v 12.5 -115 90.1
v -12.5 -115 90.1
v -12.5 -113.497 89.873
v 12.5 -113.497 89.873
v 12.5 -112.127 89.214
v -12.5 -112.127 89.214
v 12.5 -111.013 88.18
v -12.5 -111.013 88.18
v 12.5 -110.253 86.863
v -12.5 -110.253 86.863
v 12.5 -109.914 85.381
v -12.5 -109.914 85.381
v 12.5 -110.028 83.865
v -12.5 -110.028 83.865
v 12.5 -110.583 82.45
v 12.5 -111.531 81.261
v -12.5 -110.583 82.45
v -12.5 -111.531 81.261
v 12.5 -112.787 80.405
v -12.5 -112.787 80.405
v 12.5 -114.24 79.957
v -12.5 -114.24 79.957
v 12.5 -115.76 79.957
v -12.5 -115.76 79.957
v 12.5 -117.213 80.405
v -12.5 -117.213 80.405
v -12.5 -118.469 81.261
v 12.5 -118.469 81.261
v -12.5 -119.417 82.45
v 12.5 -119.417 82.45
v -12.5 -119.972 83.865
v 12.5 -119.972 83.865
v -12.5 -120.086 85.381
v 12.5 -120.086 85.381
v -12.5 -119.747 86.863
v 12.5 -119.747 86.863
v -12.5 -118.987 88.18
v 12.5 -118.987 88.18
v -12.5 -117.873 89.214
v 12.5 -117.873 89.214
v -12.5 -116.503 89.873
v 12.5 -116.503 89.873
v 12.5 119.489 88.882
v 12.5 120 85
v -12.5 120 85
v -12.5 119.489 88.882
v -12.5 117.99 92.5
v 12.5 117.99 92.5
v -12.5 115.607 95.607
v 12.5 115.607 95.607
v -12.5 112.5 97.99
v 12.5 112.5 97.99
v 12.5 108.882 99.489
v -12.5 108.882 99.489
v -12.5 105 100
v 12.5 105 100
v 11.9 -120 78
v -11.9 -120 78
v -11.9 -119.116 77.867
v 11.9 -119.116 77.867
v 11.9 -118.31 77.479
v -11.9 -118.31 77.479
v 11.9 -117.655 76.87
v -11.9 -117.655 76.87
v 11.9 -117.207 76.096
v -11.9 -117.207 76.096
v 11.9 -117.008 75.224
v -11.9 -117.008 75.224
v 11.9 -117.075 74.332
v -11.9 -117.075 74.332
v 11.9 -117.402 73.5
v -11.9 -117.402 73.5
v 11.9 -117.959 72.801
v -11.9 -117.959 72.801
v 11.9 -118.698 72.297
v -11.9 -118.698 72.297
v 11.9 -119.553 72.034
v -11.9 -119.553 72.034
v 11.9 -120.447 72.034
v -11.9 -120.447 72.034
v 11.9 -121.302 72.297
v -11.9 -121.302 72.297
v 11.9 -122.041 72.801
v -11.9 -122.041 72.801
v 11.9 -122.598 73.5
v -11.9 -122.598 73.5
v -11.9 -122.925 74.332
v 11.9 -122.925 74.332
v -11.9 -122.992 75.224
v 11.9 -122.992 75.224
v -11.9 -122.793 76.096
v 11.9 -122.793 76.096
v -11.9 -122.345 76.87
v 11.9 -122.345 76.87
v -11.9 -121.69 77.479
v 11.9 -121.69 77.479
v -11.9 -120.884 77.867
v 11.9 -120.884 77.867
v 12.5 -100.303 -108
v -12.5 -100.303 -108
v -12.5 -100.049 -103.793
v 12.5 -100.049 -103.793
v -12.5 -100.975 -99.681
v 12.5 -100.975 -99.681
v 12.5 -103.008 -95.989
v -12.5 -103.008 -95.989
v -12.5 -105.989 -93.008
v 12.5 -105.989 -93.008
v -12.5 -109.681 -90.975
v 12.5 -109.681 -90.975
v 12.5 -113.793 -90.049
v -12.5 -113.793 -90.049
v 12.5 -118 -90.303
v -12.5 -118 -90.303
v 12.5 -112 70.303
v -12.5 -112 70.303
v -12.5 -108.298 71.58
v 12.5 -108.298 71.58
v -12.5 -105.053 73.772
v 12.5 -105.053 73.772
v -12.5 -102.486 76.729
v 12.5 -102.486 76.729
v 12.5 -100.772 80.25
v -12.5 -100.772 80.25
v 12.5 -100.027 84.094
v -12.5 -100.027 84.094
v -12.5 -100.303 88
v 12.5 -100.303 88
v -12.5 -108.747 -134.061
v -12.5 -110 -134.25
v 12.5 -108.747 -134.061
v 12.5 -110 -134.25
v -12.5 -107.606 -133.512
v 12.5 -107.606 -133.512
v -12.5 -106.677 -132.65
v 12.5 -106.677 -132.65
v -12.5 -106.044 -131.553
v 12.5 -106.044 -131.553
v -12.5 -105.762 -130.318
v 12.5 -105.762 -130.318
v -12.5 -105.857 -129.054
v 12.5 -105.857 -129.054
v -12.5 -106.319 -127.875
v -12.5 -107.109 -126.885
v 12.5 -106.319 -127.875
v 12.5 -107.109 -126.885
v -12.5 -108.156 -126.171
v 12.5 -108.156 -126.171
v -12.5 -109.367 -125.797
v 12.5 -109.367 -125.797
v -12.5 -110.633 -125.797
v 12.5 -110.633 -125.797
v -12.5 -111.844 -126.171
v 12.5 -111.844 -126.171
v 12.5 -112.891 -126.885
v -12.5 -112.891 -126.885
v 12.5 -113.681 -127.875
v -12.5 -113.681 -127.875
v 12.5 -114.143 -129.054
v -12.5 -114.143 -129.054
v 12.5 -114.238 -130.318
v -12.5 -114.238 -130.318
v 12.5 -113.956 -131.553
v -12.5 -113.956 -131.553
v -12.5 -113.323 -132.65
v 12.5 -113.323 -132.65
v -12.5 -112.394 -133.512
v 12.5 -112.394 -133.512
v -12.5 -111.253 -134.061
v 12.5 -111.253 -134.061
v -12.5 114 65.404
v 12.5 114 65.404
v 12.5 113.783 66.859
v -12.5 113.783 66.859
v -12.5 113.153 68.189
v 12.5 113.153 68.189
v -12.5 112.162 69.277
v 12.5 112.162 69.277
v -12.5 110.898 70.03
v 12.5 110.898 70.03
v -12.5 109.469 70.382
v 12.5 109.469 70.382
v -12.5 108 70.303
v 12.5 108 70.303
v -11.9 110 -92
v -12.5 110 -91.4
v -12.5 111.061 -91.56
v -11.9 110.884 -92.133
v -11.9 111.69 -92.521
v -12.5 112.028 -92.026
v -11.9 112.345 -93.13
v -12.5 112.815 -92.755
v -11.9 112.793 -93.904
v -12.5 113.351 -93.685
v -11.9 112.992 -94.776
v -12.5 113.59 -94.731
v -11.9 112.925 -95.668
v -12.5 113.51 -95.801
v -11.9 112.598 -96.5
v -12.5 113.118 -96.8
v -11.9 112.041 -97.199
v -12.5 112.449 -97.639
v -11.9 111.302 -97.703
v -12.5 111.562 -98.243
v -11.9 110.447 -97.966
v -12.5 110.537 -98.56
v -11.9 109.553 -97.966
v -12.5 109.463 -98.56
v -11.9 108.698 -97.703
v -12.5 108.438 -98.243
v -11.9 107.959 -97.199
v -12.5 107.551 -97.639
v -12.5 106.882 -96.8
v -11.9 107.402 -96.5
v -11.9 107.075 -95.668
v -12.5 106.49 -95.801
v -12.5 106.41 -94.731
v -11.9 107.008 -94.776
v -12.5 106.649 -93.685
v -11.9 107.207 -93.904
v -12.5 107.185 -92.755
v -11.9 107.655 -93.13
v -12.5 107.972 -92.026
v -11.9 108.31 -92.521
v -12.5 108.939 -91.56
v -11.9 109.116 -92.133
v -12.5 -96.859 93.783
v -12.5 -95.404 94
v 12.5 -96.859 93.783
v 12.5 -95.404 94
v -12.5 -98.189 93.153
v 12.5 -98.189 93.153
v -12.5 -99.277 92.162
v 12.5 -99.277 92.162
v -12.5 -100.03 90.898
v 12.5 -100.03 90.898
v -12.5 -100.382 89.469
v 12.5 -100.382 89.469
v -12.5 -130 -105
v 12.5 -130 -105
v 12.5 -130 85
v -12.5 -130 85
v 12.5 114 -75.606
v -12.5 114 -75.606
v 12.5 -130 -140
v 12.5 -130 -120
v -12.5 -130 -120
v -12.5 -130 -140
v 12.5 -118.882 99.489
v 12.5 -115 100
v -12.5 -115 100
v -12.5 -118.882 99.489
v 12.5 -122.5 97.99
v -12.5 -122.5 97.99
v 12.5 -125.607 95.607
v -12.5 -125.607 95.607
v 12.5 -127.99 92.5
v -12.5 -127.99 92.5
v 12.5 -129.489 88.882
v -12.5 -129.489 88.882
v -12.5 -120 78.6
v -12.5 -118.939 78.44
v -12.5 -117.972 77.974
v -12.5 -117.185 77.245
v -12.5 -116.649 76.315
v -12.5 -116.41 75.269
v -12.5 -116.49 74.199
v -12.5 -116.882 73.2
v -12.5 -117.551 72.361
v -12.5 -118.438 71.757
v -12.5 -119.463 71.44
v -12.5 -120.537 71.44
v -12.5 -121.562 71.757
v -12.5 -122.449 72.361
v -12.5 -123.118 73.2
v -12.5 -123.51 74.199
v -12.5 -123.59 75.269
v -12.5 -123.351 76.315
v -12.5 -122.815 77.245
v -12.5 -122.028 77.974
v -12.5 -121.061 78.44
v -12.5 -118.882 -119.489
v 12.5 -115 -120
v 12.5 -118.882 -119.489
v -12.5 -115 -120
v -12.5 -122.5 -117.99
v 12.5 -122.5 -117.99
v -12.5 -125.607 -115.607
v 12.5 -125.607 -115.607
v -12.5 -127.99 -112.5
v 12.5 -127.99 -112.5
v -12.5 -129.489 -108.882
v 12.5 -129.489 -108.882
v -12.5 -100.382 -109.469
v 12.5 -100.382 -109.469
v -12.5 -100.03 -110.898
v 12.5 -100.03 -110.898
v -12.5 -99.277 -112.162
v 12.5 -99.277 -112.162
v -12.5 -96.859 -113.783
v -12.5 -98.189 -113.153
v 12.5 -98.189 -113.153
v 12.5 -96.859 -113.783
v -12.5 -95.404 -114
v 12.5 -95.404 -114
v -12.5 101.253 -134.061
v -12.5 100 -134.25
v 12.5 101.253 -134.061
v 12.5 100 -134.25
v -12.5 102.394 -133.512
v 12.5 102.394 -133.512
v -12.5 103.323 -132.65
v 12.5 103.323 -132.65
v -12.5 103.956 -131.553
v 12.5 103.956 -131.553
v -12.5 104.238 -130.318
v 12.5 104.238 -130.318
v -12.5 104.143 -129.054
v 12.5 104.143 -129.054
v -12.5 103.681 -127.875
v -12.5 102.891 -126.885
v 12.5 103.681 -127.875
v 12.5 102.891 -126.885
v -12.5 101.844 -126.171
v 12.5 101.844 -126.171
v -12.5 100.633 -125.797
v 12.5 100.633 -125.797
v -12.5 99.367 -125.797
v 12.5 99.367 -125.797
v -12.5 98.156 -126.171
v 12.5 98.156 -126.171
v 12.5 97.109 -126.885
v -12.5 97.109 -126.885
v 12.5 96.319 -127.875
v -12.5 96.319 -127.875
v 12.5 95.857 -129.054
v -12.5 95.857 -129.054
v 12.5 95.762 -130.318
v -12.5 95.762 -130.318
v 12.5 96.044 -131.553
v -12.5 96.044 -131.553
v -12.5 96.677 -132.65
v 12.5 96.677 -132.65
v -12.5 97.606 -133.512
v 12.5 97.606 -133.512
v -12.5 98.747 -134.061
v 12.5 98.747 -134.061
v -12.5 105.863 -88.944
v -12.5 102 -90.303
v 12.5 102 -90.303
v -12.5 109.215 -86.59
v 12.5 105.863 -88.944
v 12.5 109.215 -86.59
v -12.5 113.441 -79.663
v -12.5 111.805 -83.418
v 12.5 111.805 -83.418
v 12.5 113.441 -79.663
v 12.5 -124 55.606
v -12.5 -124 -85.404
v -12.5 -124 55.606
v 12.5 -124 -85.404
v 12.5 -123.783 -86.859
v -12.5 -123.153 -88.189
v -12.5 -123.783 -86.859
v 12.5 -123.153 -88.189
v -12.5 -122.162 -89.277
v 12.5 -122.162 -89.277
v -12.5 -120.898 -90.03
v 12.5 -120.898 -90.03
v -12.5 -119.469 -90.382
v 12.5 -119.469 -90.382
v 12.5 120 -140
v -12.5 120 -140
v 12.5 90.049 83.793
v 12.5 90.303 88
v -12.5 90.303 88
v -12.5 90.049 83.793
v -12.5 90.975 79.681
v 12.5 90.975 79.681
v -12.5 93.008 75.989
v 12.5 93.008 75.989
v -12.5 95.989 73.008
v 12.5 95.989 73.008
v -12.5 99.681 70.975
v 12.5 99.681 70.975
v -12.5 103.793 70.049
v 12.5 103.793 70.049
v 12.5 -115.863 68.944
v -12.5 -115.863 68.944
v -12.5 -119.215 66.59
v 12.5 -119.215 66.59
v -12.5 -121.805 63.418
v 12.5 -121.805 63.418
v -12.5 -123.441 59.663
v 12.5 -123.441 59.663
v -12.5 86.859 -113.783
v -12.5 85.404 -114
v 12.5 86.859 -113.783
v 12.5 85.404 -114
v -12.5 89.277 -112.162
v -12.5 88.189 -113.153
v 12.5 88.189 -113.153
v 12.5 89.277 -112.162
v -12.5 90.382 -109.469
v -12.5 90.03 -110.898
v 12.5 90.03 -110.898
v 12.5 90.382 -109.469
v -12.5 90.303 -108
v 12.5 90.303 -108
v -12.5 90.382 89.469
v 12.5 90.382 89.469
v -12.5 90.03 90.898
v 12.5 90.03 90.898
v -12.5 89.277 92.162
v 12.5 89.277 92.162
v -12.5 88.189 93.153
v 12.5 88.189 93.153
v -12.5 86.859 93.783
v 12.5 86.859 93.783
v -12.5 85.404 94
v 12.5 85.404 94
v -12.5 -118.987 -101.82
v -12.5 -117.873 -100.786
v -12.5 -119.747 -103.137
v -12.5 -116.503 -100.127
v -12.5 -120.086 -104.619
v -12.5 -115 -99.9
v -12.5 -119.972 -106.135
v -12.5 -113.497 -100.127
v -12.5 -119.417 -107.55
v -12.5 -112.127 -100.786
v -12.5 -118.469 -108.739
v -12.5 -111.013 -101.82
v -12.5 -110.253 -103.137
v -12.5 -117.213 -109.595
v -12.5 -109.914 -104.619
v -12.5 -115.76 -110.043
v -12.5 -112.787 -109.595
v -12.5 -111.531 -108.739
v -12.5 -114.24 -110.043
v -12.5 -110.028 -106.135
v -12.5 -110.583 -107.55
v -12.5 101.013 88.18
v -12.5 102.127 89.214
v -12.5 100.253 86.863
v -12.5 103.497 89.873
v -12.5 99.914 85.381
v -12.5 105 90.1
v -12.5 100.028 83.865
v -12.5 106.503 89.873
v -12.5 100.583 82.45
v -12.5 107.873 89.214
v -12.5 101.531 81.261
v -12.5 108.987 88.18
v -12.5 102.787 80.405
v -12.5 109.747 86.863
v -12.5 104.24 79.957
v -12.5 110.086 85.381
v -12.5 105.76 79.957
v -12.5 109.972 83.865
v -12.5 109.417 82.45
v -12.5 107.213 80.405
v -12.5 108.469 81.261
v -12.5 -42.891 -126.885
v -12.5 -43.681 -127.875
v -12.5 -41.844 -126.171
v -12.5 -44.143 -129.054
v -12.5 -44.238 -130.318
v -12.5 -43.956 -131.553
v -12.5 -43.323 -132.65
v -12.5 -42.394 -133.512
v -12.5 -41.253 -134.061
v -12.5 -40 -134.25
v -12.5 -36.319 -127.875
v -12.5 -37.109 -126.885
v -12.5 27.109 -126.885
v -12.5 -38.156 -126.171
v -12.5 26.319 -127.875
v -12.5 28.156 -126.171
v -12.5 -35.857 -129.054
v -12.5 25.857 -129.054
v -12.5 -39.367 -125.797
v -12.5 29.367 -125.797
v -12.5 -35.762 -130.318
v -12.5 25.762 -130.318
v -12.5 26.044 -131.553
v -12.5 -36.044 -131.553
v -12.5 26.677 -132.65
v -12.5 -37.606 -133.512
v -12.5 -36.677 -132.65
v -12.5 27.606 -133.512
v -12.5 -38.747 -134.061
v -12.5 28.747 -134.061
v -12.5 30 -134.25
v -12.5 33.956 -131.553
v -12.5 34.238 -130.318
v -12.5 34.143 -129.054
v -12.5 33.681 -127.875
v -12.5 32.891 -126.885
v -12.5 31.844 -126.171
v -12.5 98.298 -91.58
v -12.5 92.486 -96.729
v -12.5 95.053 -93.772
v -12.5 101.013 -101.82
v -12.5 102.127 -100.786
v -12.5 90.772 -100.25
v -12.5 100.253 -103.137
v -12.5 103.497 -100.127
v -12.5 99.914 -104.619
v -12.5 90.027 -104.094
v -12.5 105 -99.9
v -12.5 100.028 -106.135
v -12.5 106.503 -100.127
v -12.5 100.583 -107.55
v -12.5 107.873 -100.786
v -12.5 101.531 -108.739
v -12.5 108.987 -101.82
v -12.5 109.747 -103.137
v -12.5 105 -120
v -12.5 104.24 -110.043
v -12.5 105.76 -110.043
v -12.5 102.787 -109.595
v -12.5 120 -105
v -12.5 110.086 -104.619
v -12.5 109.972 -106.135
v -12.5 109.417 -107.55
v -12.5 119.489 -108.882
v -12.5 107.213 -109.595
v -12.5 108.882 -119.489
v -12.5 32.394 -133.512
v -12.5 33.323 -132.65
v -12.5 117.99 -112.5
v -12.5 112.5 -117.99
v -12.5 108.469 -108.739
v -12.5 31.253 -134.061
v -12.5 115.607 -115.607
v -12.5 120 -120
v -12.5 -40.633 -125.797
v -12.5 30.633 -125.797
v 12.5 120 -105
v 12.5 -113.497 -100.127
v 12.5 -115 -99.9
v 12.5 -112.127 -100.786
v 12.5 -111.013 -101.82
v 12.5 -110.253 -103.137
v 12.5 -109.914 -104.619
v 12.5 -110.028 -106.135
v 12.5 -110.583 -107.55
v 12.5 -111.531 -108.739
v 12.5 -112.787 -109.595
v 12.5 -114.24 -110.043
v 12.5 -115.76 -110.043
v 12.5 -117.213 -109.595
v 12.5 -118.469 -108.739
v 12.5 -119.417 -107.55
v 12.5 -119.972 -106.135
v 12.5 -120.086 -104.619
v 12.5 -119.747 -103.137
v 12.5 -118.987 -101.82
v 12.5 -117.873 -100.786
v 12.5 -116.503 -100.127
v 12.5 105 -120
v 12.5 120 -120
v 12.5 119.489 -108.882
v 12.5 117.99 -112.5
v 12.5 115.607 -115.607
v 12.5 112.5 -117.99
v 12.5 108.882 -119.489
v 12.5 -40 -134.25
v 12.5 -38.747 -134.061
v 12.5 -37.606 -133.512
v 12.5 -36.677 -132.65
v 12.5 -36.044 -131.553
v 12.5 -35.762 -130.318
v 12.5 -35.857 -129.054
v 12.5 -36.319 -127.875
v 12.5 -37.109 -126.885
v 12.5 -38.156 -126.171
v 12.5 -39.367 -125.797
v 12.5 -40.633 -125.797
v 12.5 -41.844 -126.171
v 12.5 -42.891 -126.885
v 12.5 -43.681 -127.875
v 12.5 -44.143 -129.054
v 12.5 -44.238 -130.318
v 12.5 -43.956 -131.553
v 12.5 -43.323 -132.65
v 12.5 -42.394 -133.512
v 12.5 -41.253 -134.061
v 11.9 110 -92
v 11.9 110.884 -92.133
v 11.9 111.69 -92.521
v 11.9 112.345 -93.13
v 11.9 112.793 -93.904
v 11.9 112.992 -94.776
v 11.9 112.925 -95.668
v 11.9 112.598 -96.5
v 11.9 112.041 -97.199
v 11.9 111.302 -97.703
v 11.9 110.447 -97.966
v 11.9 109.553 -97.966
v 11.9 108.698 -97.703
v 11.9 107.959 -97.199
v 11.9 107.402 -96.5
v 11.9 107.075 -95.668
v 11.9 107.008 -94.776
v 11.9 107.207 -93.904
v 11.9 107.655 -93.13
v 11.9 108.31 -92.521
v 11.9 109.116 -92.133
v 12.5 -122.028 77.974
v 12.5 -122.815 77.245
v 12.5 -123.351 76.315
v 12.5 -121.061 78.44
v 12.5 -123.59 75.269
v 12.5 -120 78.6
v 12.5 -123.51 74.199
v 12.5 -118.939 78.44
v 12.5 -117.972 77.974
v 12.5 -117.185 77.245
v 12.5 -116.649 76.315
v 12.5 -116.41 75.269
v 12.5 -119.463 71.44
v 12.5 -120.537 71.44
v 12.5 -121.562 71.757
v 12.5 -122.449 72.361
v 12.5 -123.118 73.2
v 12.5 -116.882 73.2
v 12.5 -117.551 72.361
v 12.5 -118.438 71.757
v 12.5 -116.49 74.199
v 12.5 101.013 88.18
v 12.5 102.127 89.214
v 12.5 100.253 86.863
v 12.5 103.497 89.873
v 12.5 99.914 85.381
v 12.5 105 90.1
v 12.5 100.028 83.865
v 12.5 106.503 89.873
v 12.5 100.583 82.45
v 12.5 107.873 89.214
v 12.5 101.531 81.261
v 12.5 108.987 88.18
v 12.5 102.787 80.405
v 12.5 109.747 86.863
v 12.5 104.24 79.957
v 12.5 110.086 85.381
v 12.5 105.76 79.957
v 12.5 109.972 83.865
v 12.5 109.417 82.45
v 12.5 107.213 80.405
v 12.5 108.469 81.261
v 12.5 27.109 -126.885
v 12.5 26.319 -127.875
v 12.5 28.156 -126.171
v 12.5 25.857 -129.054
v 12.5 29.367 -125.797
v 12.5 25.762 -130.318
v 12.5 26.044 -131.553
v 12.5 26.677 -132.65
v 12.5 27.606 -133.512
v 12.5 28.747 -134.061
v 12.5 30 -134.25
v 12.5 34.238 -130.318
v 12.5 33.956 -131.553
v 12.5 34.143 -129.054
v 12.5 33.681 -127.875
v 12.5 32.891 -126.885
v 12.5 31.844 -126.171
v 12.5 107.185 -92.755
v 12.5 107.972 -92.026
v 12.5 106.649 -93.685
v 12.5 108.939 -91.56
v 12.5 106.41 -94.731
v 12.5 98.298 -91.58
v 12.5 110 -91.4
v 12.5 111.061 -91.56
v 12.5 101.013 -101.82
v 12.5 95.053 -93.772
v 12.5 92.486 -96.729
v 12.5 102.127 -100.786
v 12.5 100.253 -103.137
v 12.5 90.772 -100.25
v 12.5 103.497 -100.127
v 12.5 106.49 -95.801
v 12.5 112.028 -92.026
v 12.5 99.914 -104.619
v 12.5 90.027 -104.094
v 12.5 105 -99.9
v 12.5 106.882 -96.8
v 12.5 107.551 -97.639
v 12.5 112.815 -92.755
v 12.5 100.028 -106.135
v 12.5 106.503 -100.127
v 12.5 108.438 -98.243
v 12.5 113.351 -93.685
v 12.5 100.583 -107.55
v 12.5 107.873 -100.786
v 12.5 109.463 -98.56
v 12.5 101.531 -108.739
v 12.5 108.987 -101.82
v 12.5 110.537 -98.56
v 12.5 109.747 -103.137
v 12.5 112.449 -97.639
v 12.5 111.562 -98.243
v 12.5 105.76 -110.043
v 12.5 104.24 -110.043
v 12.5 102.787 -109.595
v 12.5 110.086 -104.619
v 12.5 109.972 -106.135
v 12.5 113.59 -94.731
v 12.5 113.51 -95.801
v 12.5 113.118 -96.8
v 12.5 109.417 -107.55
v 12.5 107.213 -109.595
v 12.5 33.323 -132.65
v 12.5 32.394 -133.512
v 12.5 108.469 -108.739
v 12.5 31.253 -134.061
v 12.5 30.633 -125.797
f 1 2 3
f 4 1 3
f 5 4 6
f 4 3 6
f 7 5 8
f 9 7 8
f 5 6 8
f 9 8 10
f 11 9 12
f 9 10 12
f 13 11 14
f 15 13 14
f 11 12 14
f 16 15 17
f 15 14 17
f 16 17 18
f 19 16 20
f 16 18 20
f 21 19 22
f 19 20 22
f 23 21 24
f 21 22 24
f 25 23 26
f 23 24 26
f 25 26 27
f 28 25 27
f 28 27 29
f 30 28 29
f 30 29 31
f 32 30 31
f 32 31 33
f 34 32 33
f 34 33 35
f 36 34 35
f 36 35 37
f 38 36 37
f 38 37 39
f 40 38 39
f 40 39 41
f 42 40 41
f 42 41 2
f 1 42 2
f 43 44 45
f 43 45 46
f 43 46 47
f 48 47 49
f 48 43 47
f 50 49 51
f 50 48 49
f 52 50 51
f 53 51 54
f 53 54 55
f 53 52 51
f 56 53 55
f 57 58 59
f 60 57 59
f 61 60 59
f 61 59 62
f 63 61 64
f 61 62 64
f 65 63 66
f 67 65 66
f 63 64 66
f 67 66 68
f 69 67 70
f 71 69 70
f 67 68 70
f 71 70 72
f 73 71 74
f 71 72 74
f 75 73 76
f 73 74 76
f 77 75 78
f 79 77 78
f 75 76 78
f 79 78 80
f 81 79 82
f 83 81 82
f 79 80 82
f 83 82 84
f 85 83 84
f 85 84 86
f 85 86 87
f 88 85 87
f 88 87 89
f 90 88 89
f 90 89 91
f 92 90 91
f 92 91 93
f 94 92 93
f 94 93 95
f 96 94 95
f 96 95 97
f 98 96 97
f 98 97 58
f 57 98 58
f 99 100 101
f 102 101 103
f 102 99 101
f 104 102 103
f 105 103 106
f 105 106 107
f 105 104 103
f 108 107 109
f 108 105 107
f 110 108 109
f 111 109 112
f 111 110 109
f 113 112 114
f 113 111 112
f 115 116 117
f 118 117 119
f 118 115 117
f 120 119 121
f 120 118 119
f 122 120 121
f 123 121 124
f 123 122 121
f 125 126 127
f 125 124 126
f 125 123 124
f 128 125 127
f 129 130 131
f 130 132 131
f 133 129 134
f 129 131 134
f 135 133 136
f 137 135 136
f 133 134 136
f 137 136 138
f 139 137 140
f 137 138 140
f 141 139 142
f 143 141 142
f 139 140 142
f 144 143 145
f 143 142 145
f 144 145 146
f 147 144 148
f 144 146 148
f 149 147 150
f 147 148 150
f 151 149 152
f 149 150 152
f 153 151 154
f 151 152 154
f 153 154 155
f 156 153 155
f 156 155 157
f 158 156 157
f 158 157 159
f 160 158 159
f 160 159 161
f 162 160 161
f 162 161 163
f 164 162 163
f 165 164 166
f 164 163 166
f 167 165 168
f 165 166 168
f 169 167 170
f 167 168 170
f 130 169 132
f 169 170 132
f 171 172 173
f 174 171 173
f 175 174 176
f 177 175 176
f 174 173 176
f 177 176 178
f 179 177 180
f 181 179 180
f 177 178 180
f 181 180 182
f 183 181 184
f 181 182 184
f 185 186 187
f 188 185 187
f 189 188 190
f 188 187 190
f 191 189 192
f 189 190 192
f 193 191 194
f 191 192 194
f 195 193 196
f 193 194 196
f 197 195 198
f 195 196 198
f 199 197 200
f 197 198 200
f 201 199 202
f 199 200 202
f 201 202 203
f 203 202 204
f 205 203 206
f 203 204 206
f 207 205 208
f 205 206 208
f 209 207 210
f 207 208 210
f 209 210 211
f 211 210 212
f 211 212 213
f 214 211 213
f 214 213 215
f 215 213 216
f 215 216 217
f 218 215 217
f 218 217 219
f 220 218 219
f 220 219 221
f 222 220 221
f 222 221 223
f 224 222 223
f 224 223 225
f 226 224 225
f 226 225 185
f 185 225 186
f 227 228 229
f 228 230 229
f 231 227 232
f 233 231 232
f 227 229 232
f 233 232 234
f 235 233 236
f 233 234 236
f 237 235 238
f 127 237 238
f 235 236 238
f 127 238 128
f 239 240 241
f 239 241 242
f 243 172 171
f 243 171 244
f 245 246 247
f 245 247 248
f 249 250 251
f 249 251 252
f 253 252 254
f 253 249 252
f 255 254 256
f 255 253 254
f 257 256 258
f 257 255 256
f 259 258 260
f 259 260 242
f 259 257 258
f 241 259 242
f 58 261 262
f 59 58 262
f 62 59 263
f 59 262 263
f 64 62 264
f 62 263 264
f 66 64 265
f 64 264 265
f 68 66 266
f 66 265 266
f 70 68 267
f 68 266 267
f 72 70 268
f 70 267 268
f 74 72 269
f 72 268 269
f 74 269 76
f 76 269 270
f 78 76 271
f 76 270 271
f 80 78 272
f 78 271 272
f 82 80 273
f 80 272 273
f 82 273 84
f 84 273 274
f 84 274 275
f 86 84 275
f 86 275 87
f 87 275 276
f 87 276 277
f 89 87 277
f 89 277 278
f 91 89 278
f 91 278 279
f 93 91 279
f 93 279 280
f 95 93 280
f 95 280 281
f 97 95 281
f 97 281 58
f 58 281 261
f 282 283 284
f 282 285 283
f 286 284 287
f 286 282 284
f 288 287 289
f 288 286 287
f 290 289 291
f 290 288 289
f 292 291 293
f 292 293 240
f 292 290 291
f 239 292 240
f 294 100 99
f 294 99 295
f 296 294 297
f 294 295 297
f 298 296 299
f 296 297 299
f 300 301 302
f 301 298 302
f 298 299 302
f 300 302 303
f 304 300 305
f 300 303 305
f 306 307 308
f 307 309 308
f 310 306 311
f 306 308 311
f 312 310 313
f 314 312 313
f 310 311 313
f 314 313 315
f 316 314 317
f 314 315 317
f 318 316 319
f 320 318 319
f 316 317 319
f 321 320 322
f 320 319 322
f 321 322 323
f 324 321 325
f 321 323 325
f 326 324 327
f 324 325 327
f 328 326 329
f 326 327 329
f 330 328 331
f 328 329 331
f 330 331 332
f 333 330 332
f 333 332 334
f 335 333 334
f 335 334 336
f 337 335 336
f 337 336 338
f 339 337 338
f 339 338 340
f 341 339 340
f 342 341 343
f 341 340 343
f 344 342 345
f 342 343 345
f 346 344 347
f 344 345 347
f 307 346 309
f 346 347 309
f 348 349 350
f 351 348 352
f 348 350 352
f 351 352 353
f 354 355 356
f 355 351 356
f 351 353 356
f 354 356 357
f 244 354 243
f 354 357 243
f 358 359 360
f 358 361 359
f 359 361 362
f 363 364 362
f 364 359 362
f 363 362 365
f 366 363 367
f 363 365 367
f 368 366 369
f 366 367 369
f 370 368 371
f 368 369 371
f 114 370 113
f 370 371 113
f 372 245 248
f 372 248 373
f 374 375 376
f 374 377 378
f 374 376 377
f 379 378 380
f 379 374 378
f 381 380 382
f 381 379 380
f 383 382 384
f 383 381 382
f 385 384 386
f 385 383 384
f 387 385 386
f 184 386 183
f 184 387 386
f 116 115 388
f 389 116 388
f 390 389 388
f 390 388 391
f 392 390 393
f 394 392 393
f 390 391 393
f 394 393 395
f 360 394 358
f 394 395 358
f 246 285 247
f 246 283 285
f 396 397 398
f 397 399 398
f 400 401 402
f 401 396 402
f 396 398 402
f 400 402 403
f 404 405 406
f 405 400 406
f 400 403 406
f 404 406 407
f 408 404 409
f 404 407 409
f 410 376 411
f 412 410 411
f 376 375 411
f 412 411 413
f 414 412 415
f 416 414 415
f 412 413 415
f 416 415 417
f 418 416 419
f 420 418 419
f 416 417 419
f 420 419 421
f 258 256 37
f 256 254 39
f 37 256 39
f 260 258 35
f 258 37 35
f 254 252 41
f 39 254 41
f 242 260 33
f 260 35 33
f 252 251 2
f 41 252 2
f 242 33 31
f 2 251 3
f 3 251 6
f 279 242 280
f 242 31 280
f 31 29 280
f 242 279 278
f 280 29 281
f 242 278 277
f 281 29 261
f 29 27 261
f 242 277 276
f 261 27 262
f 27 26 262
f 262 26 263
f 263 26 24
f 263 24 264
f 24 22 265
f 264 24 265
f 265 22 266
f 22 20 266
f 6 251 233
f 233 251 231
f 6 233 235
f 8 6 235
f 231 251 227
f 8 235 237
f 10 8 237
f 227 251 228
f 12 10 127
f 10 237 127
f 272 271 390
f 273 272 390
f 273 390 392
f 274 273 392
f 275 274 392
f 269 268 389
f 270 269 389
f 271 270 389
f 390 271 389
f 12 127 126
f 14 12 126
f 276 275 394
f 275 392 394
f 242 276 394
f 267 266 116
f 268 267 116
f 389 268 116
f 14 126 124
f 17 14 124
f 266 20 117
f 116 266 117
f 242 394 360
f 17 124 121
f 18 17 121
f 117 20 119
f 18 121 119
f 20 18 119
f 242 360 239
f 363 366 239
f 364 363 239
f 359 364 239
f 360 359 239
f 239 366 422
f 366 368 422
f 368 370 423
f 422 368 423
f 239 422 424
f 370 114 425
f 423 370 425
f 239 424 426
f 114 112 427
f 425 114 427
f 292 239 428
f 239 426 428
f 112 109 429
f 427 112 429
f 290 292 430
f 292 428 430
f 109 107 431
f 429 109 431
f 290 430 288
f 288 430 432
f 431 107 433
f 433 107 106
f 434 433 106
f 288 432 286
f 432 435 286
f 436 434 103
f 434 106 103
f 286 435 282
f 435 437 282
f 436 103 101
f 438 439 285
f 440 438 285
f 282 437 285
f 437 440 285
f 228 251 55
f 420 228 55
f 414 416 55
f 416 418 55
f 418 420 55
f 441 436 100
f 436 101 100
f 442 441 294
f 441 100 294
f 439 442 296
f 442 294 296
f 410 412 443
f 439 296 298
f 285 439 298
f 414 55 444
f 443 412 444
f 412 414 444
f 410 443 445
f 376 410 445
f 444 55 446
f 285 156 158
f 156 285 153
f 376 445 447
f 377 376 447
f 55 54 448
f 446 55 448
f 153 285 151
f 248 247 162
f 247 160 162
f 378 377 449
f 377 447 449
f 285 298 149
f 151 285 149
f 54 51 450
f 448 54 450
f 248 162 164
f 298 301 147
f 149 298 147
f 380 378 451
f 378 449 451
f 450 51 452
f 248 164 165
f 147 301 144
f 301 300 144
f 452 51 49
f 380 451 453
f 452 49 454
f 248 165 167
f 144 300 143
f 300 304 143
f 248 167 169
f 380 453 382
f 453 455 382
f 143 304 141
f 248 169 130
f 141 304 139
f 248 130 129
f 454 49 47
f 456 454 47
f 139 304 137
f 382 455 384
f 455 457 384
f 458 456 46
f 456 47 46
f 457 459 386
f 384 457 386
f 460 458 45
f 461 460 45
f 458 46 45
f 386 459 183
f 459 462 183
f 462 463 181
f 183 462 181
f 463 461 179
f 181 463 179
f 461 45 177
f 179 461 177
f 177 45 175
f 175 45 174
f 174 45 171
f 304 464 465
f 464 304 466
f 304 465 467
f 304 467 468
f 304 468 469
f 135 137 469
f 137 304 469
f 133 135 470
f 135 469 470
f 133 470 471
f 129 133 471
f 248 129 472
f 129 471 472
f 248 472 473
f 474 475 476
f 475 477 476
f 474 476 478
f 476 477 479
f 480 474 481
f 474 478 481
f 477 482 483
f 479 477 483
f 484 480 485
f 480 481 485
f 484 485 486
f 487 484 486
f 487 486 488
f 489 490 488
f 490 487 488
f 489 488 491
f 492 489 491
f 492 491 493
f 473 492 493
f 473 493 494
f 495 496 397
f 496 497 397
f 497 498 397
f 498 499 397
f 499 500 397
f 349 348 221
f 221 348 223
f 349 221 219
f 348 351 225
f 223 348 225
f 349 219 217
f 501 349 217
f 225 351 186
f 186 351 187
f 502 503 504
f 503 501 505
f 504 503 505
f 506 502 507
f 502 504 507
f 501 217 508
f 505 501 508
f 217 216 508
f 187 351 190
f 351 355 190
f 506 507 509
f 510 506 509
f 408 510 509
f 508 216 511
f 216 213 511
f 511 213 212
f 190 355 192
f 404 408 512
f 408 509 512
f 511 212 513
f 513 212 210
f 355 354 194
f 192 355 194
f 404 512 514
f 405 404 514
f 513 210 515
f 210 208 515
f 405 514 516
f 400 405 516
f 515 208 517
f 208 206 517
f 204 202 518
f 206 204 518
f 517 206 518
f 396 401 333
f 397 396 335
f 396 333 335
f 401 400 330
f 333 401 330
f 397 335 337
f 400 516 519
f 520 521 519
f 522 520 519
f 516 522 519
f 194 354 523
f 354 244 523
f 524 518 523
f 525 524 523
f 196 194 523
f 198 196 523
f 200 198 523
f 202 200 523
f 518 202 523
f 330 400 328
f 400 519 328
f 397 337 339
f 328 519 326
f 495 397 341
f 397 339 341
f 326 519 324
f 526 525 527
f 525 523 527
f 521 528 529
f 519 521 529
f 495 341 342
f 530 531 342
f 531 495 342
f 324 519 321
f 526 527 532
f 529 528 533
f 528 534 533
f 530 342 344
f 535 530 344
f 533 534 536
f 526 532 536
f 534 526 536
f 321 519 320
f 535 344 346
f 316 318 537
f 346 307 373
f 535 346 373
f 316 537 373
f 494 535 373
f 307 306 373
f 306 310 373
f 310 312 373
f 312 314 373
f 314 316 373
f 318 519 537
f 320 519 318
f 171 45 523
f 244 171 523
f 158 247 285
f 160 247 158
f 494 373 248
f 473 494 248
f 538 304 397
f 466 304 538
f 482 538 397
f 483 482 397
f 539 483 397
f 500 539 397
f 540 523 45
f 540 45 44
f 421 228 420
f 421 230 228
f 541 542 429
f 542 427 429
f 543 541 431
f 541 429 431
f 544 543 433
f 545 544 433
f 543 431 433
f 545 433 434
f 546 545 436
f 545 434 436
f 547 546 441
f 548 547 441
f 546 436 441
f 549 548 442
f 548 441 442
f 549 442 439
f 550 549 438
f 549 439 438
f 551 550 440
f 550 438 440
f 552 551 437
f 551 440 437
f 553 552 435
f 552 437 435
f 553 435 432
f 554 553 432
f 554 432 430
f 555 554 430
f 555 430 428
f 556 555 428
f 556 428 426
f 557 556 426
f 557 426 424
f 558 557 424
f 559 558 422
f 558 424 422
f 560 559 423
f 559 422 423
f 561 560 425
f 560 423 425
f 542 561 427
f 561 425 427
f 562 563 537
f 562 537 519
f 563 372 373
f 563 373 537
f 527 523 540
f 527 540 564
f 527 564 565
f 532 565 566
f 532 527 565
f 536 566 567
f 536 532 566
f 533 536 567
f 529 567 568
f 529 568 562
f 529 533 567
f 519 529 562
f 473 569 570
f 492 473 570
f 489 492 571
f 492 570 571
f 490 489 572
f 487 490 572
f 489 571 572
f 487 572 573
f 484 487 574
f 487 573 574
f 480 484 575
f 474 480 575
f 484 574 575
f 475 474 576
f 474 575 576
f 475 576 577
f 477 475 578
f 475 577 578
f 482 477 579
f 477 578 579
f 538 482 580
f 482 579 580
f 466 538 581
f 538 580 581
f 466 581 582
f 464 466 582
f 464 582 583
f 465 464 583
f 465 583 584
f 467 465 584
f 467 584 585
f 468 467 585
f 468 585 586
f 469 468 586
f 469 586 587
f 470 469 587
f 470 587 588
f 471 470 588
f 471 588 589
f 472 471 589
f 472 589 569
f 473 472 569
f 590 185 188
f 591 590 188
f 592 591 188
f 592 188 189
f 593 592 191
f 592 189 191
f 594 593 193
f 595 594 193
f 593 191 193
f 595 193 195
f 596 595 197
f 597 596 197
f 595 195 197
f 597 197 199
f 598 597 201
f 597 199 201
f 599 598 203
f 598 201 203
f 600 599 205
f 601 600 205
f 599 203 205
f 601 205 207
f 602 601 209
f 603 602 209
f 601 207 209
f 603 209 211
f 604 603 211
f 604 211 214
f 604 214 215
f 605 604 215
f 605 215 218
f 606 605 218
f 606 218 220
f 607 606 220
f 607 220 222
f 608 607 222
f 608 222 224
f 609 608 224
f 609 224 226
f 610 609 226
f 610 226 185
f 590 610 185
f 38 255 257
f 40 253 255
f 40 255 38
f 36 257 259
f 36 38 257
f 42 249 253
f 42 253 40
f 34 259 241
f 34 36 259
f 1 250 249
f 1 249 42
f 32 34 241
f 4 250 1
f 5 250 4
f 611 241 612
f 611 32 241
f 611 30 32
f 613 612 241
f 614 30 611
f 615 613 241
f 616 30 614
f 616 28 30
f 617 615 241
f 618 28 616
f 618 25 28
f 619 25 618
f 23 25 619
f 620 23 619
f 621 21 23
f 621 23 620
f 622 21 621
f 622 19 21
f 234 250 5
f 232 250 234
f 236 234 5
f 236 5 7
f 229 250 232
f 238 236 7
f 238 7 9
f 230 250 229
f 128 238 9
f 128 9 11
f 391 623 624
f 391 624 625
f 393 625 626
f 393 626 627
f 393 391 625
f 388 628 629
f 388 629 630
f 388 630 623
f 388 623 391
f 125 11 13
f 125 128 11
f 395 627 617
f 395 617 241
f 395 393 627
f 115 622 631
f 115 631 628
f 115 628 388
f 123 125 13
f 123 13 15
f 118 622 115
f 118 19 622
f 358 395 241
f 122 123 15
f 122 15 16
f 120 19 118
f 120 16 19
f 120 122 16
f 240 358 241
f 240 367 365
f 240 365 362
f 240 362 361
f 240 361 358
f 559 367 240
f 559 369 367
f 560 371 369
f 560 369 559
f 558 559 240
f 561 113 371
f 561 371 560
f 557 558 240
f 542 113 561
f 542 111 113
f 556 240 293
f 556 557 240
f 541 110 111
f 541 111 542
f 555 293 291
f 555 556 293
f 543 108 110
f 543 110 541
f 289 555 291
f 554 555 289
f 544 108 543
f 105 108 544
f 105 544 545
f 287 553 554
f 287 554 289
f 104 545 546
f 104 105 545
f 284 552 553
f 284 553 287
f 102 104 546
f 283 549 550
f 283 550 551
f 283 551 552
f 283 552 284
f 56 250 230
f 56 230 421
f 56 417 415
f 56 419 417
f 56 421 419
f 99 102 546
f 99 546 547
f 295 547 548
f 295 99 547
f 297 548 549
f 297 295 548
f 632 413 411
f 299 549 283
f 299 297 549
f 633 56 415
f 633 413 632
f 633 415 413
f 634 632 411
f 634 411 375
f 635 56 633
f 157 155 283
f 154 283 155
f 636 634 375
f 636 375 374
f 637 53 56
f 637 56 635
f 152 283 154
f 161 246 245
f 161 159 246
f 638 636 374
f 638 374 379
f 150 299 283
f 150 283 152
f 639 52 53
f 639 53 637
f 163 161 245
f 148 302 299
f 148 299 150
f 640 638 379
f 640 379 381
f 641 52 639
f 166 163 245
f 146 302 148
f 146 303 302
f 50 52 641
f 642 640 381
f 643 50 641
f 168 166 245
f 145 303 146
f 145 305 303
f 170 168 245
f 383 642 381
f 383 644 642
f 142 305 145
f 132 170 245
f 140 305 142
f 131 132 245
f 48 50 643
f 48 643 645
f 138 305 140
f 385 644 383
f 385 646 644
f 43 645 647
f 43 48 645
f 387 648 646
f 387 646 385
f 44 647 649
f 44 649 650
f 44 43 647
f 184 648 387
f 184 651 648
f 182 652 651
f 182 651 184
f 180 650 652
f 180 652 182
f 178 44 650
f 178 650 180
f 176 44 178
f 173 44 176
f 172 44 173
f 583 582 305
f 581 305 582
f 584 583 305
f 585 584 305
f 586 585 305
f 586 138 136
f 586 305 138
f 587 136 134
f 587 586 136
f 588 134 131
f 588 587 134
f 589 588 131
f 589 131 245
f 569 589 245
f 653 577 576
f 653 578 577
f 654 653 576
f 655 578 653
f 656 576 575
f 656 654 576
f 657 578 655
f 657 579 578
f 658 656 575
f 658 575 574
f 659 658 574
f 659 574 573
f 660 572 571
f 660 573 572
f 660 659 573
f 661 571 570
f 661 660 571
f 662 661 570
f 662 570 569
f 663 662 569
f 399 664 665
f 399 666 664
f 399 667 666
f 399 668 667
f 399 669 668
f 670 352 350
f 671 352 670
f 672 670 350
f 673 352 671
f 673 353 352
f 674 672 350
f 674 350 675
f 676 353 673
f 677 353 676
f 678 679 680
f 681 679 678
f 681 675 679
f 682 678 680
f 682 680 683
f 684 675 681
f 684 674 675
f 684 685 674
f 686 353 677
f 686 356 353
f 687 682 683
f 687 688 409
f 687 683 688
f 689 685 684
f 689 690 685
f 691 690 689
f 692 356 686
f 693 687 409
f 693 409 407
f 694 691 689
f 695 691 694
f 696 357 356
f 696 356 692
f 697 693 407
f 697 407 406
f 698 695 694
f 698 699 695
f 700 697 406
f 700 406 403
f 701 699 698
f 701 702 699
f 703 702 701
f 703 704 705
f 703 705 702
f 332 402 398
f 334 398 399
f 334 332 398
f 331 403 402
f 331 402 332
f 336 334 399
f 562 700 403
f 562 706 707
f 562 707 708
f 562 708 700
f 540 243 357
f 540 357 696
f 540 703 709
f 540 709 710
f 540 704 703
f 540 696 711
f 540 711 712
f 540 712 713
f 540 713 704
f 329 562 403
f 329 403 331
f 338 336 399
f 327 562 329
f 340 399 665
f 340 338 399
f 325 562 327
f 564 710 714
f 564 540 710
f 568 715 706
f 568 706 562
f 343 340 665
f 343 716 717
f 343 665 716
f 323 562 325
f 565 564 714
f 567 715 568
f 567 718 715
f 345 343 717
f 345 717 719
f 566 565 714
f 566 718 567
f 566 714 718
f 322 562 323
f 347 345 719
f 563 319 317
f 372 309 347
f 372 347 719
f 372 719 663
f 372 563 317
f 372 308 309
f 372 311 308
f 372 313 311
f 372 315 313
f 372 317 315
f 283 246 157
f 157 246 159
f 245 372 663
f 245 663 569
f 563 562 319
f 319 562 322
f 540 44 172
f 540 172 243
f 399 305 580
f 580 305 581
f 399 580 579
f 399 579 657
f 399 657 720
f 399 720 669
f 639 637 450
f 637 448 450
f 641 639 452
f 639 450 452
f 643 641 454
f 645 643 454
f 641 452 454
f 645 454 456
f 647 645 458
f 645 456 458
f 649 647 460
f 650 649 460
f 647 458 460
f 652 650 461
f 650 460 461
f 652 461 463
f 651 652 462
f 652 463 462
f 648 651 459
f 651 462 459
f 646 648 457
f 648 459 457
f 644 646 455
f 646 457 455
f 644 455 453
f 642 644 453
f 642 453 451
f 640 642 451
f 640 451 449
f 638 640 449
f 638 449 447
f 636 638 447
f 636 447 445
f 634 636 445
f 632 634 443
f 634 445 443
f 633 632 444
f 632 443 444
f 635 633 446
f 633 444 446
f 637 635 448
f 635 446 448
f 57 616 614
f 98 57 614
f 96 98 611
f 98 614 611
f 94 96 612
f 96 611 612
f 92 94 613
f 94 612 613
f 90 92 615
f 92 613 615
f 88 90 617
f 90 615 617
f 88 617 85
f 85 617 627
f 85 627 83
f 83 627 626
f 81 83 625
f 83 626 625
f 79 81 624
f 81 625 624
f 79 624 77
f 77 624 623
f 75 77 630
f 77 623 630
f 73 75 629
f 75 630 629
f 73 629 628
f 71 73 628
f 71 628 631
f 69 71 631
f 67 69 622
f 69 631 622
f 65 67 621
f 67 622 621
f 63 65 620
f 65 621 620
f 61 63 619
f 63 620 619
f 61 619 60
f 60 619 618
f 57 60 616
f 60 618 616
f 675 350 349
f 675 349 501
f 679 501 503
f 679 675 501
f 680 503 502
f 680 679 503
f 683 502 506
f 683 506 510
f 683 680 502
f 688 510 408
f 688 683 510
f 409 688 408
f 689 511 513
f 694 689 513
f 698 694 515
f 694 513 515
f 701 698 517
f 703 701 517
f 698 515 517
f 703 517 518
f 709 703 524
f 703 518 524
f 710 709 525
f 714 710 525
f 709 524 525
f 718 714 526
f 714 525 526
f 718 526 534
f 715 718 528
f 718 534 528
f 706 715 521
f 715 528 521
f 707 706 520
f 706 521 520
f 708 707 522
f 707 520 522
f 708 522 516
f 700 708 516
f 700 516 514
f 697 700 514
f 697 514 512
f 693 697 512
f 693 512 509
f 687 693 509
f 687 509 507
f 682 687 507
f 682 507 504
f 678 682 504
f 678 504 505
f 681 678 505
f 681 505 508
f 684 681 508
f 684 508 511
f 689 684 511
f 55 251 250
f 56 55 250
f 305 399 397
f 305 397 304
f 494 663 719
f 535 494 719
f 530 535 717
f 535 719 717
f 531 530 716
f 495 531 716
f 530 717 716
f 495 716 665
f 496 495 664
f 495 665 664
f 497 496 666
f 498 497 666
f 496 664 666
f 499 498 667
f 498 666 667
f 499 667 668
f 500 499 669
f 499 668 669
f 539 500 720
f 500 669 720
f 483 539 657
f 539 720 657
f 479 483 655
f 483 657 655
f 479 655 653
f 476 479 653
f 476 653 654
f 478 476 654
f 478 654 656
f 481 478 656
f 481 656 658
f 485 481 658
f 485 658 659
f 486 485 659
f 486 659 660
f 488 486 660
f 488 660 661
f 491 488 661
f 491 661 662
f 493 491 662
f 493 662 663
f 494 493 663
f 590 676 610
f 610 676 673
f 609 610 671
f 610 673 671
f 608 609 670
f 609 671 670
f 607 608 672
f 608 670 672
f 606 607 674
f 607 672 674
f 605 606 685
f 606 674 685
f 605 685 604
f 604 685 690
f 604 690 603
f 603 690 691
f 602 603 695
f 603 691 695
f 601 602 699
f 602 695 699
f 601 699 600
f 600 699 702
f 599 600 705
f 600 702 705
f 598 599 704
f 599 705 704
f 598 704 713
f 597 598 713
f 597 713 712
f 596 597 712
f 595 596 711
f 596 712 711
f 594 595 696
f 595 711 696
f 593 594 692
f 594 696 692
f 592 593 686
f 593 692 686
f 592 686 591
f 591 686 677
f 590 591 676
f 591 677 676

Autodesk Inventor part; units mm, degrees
ref_plane "YZ Plane" through (0, 0, 0) normal (1, 0, 0) x (0, 1, 0)
ref_plane "XZ Plane" through (0, 0, 0) normal (0, 1, 0) x (-1, 0, 0)
ref_plane "XY Plane" through (0, 0, 0) normal (0, 0, 1) x (1, 0, 0)
sketch "Эскиз1" plane through (0, 0, 0) normal (0, 0, 1) x (1, 0, 0)
  line L0 (-12.5, 120) -> (12.5, 120)
  line L1 (12.5, 120) -> (12.5, -130)
  line L2 (12.5, -130) -> (-12.5, -130)
  line L3 (-12.5, -130) -> (-12.5, 120)
  line L4 (-17.5, 0) -> (17.5, 0) projected
  line L5 (0, -180) -> (0, 170) projected
  point P0 (0, 0)
  dimension "d0" = 250
  dimension "d1" = 25
  dimension "d2" = 120
extrude "Выдавливание1" add sketch "Эскиз1" along normal blind 100 and the other way blind 120
sketch "Эскиз2" plane through (12.5, -130, 100) normal (1, 0, 0) x (0, 0, -1)
  line L0 (0, 250) -> (220, 250) projected
  line L1 (0, 0) -> (0, 250) projected
  line L2 (220, 250) -> (220, 0) projected
  line L3 (0, 0) -> (220, 0) projected
  line L4 (6, 244) -> (214, 244)
  line L5 (214, 244) -> (214, 6)
  line L6 (214, 6) -> (6, 6)
  line L7 (6, 6) -> (6, 244)
  point P0 (100, 130)
  dimension "d7" = 6
  dimension "d8" = 6
  dimension "d9" = 6
  dimension "d10" = 6
extrude "Выдавливание2" cut sketch "Эскиз2" against normal through all contours L4 L5 L6 L7
fillet "Сопряжение1" radius 15 4 edges at (0, 120, 100) (0, 120, -120) (0, -130, 100) (0, -130, -120)
sketch "Эскиз3" plane through (12.5, -115, -120) normal (1, 0, 0) x (0, 0, -1)
  arc A0 (-205, 235) -> (-220, 220) centre (-205, 220) ccw projected
  arc A1 (0, 220) -> (-15, 235) centre (-15, 220) ccw projected
  arc A2 (-15, -15) -> (0, 0) centre (-15, 0) ccw projected
  arc A3 (-220, 0) -> (-205, -15) centre (-205, 0) ccw projected
  arc A4 (-15, -15) -> (0, 0) centre (-15, 0) ccw projected
  circle A5 centre (-205, 0) radius 15
  circle A6 centre (-15, 0) radius 15
  circle A7 centre (-15, 220) radius 15
  circle A8 centre (-205, 220) radius 15
  point P0 (-120, 115)
  dimension "d15" = 30
extrude "Выдавливание3" add sketch "Эскиз3" against normal up to surface (25 mm away)
fillet "Сопряжение2" radius 5 6 edges at (0, 93, 94) (0, 93, -114) (0, -103, -114) (0, -103, 94) (0, 114, 73) (0, -124, -93)
sketch "Эскиз4" plane through (-12.5, -115, -120) normal (-1, 0, 0) x (0, 0, 1)
  line L0 (0, 0) -> (0, 220) projected
  arc A0 (0, 0) -> (15, -15) centre (15, 0) ccw projected
  line L1 (205, -15) -> (15, -15) projected
  arc A1 (205, -15) -> (220, 0) centre (205, 0) ccw projected
  line L2 (220, 220) -> (220, 0) projected
  arc A2 (220, 220) -> (205, 235) centre (205, 220) ccw projected
  line L3 (15, 235) -> (205, 235) projected
  arc A3 (15, 235) -> (0, 220) centre (15, 220) ccw projected
  line L4 (27, 229) -> (185.4041, 229) projected
  arc A4 (190.3031, 223) -> (208, 205.3031) centre (205, 220) ccw projected
  arc A5 (214, 200.4041) -> (208, 205.3031) centre (209, 200.4041) ccw projected
  line L5 (214, 200.4041) -> (214, 19.5959) projected
  arc A6 (208, 14.6969) -> (214, 19.5959) centre (209, 19.5959) ccw projected
  arc A7 (208, 14.6969) -> (193, -9) centre (205, 0) ccw projected
  line L6 (193, -9) -> (34.5959, -9) projected
  arc A8 (29.6969, -3) -> (12, 14.6969) centre (15, 0) ccw projected
  arc A9 (6, 19.5959) -> (12, 14.6969) centre (11, 19.5959) ccw projected
  line L7 (6, 19.5959) -> (6, 200.4041) projected
  arc A10 (12, 205.3031) -> (6, 200.4041) centre (11, 200.4041) ccw projected
  arc A11 (12, 205.3031) -> (27, 229) centre (15, 220) ccw projected
  circle A12 centre (15, 0) radius 5.1
  circle A13 centre (15, 220) radius 5.1
  arc A14 (220, 220) -> (205, 235) centre (205, 220) ccw projected
  circle A15 centre (205, 220) radius 5.1
  circle A16 centre (205, 0) radius 5.1
  arc A17 (190.3031, 223) -> (185.4041, 229) centre (185.4041, 224) ccw projected
  arc A18 (29.6969, -3) -> (34.5959, -9) centre (34.5959, -4) ccw projected
  point P0 (120, 115)
  dimension "d19" = 10.2
extrude "Выдавливание4" cut sketch "Эскиз4" against normal through all contours A12 | A13 | A15 | A16
fillet "Сопряжение4" radius 15 2 edges at (0, 114, -93) (0, -124, 73)
sketch "Эскиз6" plane through (-12.5, -115, -120) normal (-1, 0, 0) x (0, 0, 1)
  circle A0 centre (15, 220) radius 5.1 projected
  circle A1 centre (205, 0) radius 5.1 projected
  circle A2 centre (195, -5) radius 3
  circle A3 centre (25, 225) radius 3
  point P0 (120, 115)
  dimension "d35" = 6
  dimension "d37" = 10
  dimension "d38" = 5
  dimension "d39" = 230
  dimension "d40" = 170
extrude "Выдавливание6" cut sketch "Эскиз6" against normal through all contours A2 | A3
chamfer "Фаска2" distance 0.6 angle 45 4 edges at (-12.5, 110, -98) (-12.5, -120, 72) (12.5, -120, 72) (12.5, 110, -98)
sketch "Эскиз7" plane through (12.5, -115, 100) normal (1, 0, 0) x (0, 0, -1)
  line L0 (15, -15) -> (205, -15) projected
  line L1 (220, 220) -> (220, 0) projected
  line L2 (15, 235) -> (205, 235) projected
  line L3 (220, -15) -> (240, -15)
  line L4 (240, -15) -> (240, 235)
  line L5 (240, 235) -> (220, 235)
  line L6 (220, 235) -> (220, -15)
  line L7 (230, -15) -> (230, 235) construction
  circle A0 centre (230, 5) radius 4.25
  circle A1 centre (230, 75) radius 4.25
  circle A2 centre (230, 145) radius 4.25
  circle A3 centre (230, 215) radius 4.25
  point P0 (100, 115)
  dimension "d46" = 20
  dimension "d49" = 8.5
  dimension "d50" = 20
  dimension "d51" = 70
  dimension "d52" = 20
  dimension "d53" = 70
extrude "Выдавливание7" add sketch "Эскиз7" against normal up to surface (25 mm away) contours L6 L5 L4 L3 L1 | A0 | A1 | A2 | A3
extrude "Выдавливание8" cut sketch "Эскиз7" against normal through all contours A0 | A1 | A2 | A3
properties part number "Корпус03"
